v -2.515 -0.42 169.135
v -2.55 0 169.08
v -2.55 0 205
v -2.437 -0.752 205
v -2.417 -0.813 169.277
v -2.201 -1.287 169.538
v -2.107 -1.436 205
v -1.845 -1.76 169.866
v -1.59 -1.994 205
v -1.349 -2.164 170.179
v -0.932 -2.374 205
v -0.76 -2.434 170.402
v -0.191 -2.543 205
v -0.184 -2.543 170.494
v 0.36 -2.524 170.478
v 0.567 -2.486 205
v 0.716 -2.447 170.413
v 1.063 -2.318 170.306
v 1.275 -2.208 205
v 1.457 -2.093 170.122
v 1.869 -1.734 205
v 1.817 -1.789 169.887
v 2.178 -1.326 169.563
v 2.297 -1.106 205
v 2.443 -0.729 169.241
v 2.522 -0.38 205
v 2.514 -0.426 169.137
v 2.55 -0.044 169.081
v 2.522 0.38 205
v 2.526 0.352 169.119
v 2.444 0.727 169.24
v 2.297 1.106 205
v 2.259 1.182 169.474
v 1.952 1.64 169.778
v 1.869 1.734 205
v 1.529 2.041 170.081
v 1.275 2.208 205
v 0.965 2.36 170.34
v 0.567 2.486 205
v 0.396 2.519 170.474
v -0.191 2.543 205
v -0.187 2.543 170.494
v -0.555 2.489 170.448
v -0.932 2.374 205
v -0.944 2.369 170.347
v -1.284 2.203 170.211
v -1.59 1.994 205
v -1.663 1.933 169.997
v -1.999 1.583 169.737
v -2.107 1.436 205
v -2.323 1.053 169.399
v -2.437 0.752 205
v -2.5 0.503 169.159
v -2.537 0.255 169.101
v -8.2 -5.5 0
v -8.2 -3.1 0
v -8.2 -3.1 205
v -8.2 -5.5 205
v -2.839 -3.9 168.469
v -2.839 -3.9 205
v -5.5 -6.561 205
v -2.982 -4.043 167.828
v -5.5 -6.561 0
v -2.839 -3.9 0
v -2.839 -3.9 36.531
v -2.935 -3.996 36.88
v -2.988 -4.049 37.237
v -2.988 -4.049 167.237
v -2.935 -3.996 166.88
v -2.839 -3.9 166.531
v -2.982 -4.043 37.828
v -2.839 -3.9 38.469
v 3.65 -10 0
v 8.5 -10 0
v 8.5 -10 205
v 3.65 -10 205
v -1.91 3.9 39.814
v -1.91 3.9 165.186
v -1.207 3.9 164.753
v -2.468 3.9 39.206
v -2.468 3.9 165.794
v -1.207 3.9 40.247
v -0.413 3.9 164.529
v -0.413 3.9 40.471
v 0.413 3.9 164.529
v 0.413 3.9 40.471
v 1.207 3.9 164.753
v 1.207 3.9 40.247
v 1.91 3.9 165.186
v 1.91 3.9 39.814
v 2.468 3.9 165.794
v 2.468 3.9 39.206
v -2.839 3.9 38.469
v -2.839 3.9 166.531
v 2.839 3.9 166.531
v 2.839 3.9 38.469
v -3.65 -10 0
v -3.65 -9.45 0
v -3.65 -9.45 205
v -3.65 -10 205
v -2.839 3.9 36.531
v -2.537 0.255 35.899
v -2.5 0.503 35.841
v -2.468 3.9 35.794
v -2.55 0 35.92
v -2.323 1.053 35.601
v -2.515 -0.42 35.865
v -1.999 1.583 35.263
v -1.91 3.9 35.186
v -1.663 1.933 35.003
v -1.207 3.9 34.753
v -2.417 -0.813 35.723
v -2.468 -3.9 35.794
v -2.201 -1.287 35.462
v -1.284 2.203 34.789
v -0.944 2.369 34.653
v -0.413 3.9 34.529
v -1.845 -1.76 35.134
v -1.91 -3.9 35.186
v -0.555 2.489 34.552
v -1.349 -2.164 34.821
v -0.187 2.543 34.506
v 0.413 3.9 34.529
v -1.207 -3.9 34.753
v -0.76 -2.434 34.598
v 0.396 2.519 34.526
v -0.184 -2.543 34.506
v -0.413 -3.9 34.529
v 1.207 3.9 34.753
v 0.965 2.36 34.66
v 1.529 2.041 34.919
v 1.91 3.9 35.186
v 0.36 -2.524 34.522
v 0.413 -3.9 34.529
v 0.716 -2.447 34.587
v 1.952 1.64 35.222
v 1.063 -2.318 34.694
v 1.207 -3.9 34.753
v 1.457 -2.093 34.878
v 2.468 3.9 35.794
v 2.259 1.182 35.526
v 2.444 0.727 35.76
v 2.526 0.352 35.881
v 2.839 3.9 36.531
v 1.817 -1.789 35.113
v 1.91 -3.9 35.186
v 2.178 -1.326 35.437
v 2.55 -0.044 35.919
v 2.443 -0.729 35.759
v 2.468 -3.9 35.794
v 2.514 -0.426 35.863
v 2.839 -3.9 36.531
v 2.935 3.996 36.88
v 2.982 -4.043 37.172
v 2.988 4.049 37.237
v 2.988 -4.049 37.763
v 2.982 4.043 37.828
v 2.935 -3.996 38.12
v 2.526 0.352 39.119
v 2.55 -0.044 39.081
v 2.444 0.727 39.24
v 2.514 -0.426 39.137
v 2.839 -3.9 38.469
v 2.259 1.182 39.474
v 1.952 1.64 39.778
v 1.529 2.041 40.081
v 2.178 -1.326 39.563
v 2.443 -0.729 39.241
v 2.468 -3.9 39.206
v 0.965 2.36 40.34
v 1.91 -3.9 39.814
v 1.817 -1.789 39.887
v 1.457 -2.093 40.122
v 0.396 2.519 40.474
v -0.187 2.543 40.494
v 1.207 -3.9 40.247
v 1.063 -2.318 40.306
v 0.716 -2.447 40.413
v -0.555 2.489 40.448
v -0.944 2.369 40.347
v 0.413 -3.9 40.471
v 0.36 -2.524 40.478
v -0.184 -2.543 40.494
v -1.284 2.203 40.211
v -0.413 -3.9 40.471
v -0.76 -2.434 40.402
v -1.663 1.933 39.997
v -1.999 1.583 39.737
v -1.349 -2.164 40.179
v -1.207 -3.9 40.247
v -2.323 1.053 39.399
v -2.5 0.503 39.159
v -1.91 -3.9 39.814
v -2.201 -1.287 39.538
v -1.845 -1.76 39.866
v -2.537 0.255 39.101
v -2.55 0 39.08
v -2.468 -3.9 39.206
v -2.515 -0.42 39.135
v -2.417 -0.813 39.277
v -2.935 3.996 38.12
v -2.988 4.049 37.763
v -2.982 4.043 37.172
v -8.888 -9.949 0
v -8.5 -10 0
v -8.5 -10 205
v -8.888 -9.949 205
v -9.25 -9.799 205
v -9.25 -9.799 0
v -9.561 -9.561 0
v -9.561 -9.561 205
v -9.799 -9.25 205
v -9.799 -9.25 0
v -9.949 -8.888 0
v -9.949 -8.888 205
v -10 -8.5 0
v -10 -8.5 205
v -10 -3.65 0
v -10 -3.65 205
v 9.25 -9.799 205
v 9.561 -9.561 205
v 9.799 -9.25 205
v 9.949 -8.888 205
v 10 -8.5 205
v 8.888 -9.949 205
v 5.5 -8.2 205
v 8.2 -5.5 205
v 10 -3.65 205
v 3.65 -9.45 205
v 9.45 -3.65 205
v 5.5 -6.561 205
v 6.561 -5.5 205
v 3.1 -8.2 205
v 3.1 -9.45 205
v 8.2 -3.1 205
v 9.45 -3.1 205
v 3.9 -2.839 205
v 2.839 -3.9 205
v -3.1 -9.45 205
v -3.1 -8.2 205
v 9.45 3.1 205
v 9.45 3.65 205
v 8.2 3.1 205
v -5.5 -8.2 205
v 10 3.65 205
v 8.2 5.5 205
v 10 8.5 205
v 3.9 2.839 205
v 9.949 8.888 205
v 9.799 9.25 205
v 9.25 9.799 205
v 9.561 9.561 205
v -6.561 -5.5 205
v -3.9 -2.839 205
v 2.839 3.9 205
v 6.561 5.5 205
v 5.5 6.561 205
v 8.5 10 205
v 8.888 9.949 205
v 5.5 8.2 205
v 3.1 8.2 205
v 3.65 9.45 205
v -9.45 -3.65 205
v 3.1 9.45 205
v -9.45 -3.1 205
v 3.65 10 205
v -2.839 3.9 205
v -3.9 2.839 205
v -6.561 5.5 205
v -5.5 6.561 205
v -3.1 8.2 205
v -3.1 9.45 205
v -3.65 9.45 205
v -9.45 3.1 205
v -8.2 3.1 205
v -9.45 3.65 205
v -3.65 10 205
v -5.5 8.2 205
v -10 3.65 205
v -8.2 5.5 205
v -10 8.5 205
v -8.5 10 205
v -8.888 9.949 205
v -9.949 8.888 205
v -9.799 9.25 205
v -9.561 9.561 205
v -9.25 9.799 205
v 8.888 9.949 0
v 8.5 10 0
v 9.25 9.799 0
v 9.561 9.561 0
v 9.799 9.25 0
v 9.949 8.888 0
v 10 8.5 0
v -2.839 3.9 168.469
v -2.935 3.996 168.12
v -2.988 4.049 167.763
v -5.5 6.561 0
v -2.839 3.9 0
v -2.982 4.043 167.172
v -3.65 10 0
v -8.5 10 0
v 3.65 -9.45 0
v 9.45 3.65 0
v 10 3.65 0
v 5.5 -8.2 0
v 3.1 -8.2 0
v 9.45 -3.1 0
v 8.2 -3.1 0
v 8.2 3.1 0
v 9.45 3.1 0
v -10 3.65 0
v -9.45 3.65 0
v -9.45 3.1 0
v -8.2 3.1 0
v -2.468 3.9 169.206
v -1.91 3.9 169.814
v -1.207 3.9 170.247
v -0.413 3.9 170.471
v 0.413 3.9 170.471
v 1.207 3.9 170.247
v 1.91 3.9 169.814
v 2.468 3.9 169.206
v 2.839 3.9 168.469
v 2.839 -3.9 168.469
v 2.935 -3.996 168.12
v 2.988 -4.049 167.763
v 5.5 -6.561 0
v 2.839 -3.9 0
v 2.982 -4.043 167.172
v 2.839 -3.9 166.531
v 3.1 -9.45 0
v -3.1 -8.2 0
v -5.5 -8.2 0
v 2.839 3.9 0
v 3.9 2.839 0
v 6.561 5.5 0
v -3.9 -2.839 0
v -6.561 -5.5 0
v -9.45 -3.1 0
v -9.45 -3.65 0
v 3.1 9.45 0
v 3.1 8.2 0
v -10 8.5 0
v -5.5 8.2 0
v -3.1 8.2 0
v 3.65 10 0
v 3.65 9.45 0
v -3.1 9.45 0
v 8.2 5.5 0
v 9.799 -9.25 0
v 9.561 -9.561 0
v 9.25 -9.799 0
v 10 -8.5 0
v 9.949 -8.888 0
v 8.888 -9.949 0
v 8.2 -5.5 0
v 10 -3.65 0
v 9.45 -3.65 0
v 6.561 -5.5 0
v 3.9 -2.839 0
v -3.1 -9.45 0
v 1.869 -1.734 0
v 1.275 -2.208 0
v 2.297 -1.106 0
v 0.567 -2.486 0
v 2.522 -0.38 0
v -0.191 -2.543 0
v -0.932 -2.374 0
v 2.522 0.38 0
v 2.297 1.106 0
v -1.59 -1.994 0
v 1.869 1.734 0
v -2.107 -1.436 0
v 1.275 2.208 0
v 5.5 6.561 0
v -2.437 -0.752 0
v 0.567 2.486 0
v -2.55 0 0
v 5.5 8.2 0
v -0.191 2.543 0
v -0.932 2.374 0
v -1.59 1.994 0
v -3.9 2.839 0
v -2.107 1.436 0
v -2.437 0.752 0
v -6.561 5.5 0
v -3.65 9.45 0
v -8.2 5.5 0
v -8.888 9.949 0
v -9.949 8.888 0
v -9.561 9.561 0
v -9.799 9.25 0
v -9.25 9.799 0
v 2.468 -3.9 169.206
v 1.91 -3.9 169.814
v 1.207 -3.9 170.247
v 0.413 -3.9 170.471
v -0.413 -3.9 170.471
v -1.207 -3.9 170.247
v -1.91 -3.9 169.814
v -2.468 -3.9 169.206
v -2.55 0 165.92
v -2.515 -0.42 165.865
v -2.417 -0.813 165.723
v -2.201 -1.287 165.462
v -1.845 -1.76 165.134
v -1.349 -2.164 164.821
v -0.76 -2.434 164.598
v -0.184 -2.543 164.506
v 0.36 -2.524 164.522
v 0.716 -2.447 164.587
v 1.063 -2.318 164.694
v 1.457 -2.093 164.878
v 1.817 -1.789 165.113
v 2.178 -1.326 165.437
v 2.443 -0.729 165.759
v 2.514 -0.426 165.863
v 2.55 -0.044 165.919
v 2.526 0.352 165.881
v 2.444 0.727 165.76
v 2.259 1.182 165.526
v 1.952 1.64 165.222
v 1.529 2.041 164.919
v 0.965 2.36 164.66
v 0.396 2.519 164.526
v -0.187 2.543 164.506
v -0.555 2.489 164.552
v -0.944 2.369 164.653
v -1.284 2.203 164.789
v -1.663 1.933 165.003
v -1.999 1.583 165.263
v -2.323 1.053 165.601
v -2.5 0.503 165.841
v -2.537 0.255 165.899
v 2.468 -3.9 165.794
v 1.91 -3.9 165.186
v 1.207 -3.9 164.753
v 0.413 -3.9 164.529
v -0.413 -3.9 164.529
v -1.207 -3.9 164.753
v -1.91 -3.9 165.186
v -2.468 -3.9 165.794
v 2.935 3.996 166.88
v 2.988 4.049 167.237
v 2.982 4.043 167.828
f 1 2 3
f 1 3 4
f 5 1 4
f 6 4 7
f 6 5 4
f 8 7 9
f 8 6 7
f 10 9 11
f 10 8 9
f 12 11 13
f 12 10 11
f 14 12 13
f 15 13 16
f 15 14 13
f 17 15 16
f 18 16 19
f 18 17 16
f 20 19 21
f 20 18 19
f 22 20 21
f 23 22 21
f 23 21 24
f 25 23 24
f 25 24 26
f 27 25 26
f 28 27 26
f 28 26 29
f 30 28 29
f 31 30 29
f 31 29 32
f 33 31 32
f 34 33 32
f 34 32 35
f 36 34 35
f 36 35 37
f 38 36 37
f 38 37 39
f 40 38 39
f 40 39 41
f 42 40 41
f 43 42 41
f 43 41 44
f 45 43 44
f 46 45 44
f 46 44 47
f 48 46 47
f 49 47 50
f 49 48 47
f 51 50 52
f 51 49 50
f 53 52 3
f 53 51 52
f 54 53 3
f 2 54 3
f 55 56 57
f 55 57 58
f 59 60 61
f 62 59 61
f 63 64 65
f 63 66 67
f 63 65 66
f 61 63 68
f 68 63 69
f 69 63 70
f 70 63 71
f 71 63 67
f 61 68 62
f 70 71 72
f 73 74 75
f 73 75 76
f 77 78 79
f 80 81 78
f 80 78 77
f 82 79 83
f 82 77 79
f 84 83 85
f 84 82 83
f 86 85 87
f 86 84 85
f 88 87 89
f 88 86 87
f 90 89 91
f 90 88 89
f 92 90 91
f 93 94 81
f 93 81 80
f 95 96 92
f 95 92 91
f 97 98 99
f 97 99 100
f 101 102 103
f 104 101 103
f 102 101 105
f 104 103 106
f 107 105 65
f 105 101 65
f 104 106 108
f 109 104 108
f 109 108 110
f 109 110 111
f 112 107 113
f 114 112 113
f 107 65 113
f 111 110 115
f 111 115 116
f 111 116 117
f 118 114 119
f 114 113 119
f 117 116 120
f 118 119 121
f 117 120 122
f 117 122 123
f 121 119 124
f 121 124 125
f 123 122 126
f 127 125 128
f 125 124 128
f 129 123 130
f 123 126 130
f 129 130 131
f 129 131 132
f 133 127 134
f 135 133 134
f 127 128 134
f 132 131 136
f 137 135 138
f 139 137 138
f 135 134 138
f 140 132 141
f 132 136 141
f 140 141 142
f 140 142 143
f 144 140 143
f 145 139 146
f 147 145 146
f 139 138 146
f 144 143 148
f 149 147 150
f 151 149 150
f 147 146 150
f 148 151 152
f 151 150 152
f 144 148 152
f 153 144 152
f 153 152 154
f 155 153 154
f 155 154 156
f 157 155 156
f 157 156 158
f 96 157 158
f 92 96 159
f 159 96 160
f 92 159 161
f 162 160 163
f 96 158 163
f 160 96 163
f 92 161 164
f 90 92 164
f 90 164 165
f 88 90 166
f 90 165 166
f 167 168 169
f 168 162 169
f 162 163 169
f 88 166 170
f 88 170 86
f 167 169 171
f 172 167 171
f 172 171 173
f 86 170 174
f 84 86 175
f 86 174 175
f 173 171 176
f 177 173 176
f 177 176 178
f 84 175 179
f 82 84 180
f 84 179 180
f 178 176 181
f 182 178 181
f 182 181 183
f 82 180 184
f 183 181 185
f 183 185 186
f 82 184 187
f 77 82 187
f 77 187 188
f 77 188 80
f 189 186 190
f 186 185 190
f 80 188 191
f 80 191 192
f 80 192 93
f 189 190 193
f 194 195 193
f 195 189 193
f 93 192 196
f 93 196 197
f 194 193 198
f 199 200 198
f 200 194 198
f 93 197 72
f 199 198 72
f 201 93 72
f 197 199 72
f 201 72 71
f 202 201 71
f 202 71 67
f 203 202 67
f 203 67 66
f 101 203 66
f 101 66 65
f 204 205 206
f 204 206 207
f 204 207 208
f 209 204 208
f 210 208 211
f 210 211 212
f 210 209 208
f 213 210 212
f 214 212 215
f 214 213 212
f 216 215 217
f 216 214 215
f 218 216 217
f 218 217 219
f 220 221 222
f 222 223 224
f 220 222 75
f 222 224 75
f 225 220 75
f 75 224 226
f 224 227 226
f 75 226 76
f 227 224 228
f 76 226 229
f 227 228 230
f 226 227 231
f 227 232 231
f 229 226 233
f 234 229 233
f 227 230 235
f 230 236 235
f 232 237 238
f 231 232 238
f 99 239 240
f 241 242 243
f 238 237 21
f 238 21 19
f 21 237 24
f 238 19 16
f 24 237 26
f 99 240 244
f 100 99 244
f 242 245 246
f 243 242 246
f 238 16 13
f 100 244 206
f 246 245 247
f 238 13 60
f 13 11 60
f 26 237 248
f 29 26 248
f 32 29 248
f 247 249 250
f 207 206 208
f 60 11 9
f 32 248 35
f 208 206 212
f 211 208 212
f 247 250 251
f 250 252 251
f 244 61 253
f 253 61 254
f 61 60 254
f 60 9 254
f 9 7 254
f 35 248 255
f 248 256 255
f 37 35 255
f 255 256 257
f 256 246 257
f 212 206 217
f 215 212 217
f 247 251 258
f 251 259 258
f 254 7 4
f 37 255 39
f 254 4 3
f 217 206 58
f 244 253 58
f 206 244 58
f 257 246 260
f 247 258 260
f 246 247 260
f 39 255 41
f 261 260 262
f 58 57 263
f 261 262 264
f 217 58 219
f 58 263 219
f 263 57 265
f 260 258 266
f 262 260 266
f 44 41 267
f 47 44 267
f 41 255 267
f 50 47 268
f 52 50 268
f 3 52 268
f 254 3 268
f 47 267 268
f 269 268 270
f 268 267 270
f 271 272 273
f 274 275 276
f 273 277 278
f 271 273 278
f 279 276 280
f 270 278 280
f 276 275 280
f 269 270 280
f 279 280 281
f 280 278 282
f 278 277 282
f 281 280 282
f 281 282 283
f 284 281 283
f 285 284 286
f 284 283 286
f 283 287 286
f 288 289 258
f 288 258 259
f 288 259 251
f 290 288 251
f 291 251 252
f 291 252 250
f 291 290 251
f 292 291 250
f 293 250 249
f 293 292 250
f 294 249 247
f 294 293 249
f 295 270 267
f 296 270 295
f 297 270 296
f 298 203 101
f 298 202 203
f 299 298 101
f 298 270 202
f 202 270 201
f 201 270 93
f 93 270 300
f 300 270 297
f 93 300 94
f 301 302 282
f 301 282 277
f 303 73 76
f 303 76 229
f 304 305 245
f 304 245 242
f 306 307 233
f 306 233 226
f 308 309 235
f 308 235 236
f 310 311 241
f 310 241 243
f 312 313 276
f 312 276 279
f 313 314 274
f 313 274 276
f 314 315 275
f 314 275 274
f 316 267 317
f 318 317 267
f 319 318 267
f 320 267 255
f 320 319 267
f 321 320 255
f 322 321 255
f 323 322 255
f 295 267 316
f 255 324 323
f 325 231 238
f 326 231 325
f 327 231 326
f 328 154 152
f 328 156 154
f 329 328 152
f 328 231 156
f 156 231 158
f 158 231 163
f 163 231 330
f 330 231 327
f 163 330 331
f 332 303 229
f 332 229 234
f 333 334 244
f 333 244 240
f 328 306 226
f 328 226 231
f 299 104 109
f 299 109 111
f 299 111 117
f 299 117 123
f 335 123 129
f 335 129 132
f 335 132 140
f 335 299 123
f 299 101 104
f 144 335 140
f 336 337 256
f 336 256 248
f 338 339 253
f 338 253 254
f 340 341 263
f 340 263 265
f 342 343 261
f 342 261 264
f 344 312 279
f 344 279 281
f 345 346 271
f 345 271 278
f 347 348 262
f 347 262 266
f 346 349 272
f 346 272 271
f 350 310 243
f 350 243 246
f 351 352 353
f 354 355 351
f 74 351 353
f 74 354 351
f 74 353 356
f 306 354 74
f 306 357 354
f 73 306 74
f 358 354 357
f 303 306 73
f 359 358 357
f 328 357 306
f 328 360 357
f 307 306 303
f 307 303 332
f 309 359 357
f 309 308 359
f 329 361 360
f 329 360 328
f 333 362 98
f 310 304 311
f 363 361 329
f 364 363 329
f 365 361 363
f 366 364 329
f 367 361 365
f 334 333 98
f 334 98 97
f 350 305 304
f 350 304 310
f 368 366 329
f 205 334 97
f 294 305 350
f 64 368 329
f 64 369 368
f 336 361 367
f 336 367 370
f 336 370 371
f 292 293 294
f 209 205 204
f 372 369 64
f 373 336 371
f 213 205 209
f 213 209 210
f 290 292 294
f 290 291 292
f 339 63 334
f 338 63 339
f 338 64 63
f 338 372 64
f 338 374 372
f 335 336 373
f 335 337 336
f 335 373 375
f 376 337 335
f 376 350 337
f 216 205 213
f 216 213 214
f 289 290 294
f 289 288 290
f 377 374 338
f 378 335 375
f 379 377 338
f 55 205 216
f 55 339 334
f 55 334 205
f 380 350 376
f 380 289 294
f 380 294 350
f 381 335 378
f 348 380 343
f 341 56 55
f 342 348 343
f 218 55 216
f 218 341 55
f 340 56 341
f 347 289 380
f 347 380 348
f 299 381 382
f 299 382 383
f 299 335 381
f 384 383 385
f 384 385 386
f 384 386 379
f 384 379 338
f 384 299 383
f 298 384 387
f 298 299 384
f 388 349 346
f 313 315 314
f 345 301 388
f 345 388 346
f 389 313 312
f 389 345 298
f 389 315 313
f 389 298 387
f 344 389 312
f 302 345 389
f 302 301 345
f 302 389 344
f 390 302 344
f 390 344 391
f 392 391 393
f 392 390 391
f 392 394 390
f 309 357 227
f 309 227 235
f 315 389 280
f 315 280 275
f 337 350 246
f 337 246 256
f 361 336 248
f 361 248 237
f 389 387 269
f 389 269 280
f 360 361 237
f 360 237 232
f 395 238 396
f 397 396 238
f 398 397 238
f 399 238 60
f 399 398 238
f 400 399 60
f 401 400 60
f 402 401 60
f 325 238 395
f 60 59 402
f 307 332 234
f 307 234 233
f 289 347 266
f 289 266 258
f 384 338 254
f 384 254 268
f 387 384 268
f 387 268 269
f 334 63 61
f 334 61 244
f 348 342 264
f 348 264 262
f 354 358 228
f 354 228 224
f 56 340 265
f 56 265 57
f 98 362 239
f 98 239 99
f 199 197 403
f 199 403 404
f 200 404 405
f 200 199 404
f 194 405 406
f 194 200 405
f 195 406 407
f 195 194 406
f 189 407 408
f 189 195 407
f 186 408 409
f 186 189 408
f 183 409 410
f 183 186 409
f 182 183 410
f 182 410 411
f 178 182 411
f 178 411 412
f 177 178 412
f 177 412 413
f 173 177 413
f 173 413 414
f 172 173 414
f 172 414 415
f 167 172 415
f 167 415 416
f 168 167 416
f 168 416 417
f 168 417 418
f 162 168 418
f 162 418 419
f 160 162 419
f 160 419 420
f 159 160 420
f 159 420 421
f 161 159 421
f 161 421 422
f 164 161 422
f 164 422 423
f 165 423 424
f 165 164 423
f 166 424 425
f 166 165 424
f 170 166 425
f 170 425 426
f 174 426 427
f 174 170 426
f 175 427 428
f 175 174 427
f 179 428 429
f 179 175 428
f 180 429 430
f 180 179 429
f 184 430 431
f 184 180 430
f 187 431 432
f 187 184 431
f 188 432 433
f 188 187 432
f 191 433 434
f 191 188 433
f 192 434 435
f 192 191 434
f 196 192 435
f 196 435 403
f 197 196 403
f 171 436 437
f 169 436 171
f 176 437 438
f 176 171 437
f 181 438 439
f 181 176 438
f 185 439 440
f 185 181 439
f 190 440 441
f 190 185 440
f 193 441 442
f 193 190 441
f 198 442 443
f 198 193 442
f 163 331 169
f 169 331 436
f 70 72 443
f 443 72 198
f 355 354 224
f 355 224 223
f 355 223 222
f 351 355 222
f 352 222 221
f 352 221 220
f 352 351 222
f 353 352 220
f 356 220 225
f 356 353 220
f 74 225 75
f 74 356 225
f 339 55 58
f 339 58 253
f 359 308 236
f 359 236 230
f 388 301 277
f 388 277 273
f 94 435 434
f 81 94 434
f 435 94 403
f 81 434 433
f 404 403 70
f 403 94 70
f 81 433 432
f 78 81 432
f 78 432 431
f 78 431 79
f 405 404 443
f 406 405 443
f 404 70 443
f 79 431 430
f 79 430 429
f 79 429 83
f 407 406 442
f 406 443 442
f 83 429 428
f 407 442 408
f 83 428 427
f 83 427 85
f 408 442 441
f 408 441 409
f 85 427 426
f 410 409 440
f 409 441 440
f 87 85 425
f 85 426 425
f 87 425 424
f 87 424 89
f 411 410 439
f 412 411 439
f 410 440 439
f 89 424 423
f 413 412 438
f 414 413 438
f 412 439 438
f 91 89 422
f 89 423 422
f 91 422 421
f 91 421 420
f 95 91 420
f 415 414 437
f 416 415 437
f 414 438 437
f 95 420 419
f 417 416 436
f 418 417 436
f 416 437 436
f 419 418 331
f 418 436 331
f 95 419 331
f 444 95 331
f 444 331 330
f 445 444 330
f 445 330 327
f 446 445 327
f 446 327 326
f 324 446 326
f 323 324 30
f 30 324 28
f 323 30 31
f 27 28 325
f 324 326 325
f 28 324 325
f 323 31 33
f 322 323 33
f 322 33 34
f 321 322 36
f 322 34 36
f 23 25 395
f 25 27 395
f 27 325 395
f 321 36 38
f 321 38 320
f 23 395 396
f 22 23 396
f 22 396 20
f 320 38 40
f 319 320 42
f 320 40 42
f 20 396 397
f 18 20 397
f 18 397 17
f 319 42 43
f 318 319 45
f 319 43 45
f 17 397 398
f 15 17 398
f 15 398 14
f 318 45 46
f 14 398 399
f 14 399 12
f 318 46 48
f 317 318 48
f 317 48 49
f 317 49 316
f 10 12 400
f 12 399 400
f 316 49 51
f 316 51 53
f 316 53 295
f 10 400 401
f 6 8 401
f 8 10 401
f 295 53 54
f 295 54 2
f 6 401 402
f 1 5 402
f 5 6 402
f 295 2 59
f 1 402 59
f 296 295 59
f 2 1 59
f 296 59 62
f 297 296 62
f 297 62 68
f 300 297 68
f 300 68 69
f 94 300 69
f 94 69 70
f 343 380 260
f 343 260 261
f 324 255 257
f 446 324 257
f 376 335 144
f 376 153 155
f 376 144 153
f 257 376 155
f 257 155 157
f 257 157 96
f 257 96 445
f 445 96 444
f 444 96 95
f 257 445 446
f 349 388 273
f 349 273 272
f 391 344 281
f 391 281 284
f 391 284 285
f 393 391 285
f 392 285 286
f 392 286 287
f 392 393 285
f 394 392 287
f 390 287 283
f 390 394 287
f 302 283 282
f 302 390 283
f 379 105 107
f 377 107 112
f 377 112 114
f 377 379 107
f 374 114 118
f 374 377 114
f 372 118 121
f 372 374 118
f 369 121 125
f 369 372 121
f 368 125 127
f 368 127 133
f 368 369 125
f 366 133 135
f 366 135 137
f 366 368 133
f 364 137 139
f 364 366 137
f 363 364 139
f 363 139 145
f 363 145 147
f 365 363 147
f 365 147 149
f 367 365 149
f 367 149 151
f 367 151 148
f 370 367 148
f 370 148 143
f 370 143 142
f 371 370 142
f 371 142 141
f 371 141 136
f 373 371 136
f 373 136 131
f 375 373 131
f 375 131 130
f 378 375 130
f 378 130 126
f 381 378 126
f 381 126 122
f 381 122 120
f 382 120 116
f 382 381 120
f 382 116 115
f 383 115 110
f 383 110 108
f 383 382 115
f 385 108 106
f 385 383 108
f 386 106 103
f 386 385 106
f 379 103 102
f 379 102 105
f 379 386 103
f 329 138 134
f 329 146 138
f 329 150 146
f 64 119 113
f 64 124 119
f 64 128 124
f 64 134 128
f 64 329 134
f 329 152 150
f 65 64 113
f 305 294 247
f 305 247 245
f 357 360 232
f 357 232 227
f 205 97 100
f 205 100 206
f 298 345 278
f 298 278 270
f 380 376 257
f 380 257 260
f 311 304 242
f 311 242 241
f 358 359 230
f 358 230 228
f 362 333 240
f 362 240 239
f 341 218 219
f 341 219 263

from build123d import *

# Parameters (mm, degrees)
SKETCH_2_R          = 2.55
EXTRUDE_1_DEPTH     = 205
SKETCH_3_R          = 3
CUT_EXTRUDE_1_DEPTH = 207.215906273


with BuildPart() as part:
    # 草图2 → 凸台-拉伸1 (new body)
    with BuildSketch(Plane.XY):
        with BuildLine():
            Line((-3.9, 2.839339828), (-6.560660172, 5.5))
            Line((-6.560660172, 5.5), (-8.2, 5.5))
            Line((-8.2, 5.5), (-8.2, 3.1))
            Line((-8.2, 3.1), (-9.45, 3.1))
            Line((-9.45, 3.1), (-9.45, 3.65))
            Line((-9.45, 3.65), (-10, 3.65))
            Line((-10, 3.65), (-10, 8.5))
            ThreePointArc((-10, 8.5), (-9.560660172, 9.560660172), (-8.5, 10))
            Line((-8.5, 10), (-3.65, 10))
            Line((-3.65, 10), (-3.65, 9.45))
            Line((-3.65, 9.45), (-3.1, 9.45))
            Line((-3.1, 9.45), (-3.1, 8.2))
            Line((-3.1, 8.2), (-5.5, 8.2))
            Line((-5.5, 8.2), (-5.5, 6.560660172))
            Line((-5.5, 6.560660172), (-2.839339828, 3.9))
            Line((-2.839339828, 3.9), (2.839339828, 3.9))
            Line((2.839339828, 3.9), (5.5, 6.560660172))
            Line((5.5, 6.560660172), (5.5, 8.2))
            Line((5.5, 8.2), (3.1, 8.2))
            Line((3.1, 8.2), (3.1, 9.45))
            Line((3.1, 9.45), (3.65, 9.45))
            Line((3.65, 9.45), (3.65, 10))
            Line((3.65, 10), (8.5, 10))
            ThreePointArc((8.5, 10), (9.560660172, 9.560660172), (10, 8.5))
            Line((10, 8.5), (10, 3.65))
            Line((10, 3.65), (9.45, 3.65))
            Line((9.45, 3.65), (9.45, 3.1))
            Line((9.45, 3.1), (8.2, 3.1))
            Line((8.2, 3.1), (8.2, 5.5))
            Line((8.2, 5.5), (6.560660172, 5.5))
            Line((6.560660172, 5.5), (3.9, 2.839339828))
            Line((3.9, 2.839339828), (3.9, -2.839339828))
            Line((3.9, -2.839339828), (6.560660172, -5.5))
            Line((6.560660172, -5.5), (8.2, -5.5))
            Line((8.2, -5.5), (8.2, -3.1))
            Line((8.2, -3.1), (9.45, -3.1))
            Line((9.45, -3.1), (9.45, -3.65))
            Line((9.45, -3.65), (10, -3.65))
            Line((10, -3.65), (10, -8.5))
            ThreePointArc((10, -8.5), (9.560660172, -9.560660172), (8.5, -10))
            Line((8.5, -10), (3.65, -10))
            Line((3.65, -10), (3.65, -9.45))
            Line((3.65, -9.45), (3.1, -9.45))
            Line((3.1, -9.45), (3.1, -8.2))
            Line((3.1, -8.2), (5.5, -8.2))
            Line((5.5, -8.2), (5.5, -6.560660172))
            Line((5.5, -6.560660172), (2.839339828, -3.9))
            Line((2.839339828, -3.9), (-2.839339828, -3.9))
            Line((-2.839339828, -3.9), (-5.5, -6.560660172))
            Line((-5.5, -6.560660172), (-5.5, -8.2))
            Line((-5.5, -8.2), (-3.1, -8.2))
            Line((-3.1, -8.2), (-3.1, -9.45))
            Line((-3.1, -9.45), (-3.65, -9.45))
            Line((-3.65, -9.45), (-3.65, -10))
            Line((-3.65, -10), (-8.5, -10))
            ThreePointArc((-8.5, -10), (-9.560660172, -9.560660172), (-10, -8.5))
            Line((-10, -8.5), (-10, -3.65))
            Line((-10, -3.65), (-9.45, -3.65))
            Line((-9.45, -3.65), (-9.45, -3.1))
            Line((-9.45, -3.1), (-8.2, -3.1))
            Line((-8.2, -3.1), (-8.2, -5.5))
            Line((-8.2, -5.5), (-6.560660172, -5.5))
            Line((-6.560660172, -5.5), (-3.9, -2.839339828))
            Line((-3.9, -2.839339828), (-3.9, 2.839339828))
        make_face()
        with Locations(Location((0, 0, 0), (0, 0, 180))):
            Circle(SKETCH_2_R, mode=Mode.SUBTRACT)
    extrude(amount=EXTRUDE_1_DEPTH)

    # 草图3 → 切除-拉伸1 (cut, through all)
    with BuildSketch(Plane.XZ.offset(10)):
        with Locations(Location((0, 167.5, 0), (0, 0, 198.835996158))):
            Circle(SKETCH_3_R)
        with Locations(Location((0, 37.5, 0), (0, 0, 198.835996158))):
            Circle(SKETCH_3_R)
    extrude(amount=-CUT_EXTRUDE_1_DEPTH, mode=Mode.SUBTRACT)


solid = part.part
